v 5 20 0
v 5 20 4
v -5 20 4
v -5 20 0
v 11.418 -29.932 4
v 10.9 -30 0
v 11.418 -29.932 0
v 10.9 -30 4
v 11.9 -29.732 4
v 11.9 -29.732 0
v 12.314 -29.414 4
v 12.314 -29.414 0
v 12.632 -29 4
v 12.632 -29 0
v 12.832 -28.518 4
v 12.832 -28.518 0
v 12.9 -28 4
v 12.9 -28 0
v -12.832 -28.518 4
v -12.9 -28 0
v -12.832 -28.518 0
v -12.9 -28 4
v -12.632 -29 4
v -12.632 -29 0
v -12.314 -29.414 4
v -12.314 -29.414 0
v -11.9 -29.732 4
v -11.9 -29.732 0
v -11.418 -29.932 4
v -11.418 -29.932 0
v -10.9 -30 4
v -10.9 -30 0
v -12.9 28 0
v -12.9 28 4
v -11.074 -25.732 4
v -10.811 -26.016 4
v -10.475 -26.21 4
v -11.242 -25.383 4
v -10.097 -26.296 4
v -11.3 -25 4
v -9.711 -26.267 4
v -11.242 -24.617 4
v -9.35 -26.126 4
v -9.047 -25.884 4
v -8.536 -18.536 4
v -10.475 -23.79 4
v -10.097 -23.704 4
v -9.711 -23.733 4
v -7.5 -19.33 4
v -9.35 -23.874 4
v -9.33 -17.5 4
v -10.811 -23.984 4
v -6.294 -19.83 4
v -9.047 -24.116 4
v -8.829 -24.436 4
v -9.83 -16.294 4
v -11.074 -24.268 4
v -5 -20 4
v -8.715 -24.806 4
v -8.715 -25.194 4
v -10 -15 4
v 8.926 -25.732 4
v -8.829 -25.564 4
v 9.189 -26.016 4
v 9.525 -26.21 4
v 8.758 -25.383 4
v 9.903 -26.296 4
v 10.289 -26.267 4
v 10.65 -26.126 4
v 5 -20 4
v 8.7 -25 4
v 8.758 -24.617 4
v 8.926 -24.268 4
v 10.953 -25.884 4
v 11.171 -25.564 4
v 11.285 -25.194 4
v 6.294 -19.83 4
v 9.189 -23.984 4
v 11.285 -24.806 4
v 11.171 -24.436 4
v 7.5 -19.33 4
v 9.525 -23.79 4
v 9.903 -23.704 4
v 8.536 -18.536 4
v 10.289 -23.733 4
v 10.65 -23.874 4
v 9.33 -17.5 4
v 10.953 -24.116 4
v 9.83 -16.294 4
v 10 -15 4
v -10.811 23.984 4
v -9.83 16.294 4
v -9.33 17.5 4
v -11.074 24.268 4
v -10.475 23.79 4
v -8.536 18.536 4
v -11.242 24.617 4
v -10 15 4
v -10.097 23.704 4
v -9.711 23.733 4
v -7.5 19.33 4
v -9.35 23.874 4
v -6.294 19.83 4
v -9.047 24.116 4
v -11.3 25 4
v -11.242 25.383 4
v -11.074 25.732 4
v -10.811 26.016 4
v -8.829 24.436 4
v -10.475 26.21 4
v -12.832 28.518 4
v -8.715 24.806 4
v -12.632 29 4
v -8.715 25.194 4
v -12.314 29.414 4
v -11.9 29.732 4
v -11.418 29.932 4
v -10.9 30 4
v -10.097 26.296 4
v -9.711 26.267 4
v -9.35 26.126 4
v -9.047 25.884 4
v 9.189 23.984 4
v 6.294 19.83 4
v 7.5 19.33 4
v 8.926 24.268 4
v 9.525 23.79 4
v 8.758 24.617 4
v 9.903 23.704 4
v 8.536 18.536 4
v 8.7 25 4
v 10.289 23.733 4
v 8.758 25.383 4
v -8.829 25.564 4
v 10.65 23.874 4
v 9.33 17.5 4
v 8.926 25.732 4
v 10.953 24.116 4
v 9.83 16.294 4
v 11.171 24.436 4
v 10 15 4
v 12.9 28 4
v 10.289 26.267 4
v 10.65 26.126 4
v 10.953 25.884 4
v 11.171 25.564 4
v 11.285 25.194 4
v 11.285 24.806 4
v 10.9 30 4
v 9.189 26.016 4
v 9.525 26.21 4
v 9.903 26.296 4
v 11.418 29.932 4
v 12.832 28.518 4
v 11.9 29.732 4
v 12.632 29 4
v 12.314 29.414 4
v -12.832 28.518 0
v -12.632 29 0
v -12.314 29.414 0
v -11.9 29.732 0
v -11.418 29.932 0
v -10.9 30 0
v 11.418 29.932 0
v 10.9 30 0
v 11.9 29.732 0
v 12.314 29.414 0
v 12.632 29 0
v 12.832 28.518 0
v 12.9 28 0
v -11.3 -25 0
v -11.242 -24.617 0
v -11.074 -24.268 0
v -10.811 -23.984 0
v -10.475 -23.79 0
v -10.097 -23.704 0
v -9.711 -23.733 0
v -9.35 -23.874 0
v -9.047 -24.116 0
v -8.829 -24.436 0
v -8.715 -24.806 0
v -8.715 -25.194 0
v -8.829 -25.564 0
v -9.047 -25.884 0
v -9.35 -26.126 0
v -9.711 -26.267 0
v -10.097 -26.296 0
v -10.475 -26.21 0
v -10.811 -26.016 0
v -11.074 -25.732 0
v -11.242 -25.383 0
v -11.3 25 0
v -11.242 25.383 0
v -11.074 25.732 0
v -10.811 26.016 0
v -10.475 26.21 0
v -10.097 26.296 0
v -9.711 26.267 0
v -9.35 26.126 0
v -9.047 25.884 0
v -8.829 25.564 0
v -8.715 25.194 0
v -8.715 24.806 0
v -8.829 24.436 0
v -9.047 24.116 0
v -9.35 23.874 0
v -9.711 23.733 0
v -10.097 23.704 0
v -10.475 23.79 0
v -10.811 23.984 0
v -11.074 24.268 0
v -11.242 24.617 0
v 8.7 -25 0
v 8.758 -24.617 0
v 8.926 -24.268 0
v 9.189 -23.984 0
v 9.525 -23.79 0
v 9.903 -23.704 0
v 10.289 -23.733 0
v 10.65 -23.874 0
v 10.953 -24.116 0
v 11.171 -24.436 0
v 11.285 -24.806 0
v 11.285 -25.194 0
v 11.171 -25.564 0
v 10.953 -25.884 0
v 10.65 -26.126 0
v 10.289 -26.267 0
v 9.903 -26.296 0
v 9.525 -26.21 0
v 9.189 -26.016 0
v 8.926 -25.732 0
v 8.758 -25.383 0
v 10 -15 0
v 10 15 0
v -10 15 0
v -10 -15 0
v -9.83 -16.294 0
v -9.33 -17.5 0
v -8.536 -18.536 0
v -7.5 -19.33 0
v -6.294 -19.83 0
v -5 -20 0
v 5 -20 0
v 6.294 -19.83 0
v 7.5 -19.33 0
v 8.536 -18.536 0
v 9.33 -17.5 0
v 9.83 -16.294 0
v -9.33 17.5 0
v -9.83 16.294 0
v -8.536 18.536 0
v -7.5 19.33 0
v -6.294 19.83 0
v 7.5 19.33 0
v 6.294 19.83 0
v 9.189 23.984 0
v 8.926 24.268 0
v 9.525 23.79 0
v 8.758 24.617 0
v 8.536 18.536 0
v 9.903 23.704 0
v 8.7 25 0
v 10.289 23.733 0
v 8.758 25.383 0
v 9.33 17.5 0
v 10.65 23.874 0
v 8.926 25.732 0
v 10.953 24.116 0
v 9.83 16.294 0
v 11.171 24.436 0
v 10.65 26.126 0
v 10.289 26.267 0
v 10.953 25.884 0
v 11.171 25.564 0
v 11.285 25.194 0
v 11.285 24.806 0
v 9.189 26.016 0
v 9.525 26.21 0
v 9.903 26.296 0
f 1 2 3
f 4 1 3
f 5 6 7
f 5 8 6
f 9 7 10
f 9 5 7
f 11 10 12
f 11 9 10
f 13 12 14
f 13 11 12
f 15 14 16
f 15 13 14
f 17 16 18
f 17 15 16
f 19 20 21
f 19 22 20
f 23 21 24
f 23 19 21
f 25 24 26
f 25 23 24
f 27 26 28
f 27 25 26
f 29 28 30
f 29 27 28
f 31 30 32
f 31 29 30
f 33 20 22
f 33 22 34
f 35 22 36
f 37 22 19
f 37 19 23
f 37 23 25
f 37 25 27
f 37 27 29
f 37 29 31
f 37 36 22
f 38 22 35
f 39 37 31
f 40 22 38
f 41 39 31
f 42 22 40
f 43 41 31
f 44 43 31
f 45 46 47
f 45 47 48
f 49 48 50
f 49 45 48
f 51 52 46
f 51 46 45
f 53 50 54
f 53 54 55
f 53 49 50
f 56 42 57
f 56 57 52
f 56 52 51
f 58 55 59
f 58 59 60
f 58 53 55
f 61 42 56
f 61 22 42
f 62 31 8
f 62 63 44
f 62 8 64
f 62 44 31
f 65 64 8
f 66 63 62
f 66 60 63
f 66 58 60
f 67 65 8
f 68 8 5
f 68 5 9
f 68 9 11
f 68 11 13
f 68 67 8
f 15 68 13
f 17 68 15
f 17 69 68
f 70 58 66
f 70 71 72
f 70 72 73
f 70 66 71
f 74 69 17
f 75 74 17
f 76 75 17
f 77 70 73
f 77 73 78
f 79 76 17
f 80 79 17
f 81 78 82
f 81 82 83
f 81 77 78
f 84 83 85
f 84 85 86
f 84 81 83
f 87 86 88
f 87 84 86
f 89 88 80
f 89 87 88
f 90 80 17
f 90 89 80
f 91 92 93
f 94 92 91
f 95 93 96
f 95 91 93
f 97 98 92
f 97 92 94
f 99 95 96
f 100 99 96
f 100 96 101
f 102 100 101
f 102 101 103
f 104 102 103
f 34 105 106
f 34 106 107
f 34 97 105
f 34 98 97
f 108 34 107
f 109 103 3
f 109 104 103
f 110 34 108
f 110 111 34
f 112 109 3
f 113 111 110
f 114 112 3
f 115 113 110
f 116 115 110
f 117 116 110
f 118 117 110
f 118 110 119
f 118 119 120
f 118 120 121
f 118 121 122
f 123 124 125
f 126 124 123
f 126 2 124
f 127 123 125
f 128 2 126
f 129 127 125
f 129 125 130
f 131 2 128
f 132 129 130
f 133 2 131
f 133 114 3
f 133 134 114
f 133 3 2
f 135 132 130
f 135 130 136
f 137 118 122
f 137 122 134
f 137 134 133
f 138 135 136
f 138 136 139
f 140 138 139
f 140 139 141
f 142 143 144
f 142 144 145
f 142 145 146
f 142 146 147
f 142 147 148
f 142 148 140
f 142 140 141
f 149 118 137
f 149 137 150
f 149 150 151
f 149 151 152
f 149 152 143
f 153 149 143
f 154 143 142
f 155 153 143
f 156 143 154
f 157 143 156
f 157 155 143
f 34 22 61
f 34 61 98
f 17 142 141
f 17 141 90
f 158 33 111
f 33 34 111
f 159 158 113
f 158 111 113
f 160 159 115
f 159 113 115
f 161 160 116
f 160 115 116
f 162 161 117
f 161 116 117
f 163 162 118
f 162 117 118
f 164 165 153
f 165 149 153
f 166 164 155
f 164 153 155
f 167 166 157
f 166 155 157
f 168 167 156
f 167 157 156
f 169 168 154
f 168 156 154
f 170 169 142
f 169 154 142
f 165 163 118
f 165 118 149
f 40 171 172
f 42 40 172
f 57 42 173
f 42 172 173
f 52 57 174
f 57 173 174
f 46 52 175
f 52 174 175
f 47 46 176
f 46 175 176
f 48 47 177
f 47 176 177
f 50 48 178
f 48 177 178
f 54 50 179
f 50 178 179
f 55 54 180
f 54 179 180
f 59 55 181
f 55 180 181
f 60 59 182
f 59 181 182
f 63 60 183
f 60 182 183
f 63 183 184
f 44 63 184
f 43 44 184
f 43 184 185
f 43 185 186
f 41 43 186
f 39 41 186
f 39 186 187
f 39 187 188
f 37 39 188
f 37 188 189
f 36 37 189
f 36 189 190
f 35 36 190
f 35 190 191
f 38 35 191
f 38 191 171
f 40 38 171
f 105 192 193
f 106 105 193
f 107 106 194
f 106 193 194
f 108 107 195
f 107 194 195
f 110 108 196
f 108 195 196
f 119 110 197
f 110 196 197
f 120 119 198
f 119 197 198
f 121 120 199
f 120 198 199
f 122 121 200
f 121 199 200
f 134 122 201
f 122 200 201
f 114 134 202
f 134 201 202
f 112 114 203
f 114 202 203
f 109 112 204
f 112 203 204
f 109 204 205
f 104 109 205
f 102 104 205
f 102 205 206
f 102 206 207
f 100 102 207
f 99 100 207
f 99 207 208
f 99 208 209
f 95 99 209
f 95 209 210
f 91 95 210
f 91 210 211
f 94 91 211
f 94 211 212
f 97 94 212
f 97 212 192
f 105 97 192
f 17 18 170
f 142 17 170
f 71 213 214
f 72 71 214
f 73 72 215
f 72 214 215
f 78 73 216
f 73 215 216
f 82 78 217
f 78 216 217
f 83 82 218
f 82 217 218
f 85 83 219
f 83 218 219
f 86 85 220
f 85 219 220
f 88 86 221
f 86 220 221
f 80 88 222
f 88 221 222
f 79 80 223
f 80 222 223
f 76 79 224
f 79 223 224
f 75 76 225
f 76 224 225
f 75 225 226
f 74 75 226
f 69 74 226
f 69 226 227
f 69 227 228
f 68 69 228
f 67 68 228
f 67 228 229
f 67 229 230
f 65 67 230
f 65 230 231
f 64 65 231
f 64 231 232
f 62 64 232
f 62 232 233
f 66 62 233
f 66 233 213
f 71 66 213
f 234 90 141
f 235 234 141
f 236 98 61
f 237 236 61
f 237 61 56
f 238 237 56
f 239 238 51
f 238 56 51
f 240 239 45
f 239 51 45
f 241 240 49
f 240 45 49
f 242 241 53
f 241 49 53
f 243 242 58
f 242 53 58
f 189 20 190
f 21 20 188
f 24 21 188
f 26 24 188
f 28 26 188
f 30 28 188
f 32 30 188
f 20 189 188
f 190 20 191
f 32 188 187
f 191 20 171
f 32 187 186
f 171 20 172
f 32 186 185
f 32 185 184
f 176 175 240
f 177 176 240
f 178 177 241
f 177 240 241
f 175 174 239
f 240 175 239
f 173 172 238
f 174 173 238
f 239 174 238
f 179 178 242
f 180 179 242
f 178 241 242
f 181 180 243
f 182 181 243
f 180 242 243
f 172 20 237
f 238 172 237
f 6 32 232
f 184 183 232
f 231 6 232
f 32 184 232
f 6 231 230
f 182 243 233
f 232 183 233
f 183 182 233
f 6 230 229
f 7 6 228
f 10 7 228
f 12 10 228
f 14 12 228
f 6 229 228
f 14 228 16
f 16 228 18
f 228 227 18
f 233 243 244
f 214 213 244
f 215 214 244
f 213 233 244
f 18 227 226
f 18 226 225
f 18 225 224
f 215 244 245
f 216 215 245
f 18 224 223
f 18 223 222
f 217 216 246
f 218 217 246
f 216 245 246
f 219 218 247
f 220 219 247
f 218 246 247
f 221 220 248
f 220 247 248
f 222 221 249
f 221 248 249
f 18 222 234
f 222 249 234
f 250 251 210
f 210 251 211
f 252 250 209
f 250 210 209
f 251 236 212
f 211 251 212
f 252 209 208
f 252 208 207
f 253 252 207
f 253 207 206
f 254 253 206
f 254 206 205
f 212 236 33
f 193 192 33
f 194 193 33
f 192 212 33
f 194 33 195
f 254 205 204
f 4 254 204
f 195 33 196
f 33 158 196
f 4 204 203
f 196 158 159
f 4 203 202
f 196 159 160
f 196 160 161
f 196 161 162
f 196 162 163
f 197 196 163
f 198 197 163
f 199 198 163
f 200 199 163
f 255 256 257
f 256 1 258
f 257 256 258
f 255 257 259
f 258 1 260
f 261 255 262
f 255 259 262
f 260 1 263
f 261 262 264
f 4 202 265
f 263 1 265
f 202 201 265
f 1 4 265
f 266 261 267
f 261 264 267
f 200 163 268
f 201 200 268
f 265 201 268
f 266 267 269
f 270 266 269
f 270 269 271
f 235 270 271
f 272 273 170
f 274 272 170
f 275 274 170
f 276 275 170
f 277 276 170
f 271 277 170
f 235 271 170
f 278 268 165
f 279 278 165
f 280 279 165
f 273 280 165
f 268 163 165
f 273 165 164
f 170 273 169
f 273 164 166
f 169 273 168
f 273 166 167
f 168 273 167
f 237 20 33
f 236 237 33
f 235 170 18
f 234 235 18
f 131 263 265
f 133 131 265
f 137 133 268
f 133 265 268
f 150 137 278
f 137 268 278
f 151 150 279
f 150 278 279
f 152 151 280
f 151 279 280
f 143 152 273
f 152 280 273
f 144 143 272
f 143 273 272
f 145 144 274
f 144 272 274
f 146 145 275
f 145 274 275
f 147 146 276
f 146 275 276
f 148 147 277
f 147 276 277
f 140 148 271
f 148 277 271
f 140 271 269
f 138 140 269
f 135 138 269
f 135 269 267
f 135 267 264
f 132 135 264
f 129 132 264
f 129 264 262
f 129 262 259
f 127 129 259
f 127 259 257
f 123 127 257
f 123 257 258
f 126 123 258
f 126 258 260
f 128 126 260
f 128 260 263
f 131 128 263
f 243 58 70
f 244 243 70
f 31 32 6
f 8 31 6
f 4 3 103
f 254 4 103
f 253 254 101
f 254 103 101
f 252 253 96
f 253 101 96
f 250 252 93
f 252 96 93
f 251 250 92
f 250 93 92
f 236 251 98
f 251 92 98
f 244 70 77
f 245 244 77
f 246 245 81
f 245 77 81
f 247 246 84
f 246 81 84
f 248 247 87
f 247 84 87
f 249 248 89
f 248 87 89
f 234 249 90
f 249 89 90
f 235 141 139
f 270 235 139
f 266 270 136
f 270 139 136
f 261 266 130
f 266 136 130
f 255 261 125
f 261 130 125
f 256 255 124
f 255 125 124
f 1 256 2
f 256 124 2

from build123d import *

# Parameters (mm, degrees)
SZKIC1_W                    = 25.8
SZKIC1_H                    = 60
DODANIE_WYCI_GNI_CIE1_DEPTH = 4
OTW_R_POD_RUB_M21_D         = 2.6
ZAOKR_GLENIE1_R             = 2
WYTNIJ_WYCI_GNI_CIE1_REACH  = 6


with BuildPart() as part:
    # Szkic1 → Dodanie-wyciągnięcie1 (new body)
    with BuildSketch(Plane.XY):
        Rectangle(SZKIC1_W, SZKIC1_H)
    extrude(amount=DODANIE_WYCI_GNI_CIE1_DEPTH)

    # Otwór pod śrubę M21 (through all)
    with Locations(Plane.XY.offset(4)):
        with Locations((-10, 25), (10, 25), (10, -25), (-10, -25)):
            Hole(OTW_R_POD_RUB_M21_D / 2)

    # Zaokrąglenie1
    zaokr_glenie1_edges = [part.edges().sort_by_distance(p)[0] for p in [
        (12.9, -30, 2),
        (-12.9, -30, 2),
        (-12.9, 30, 2),
        (12.9, 30, 2),
    ]]
    fillet(zaokr_glenie1_edges, radius=ZAOKR_GLENIE1_R)

    # Szkic5 → Wytnij-wyciągnięcie1 (cut, up to next)
    with BuildSketch(Plane.XY.offset(4), mode=Mode.PRIVATE) as wytnij_wyci_gni_cie1_sk1:
        with BuildLine():
            Line((5, 20), (-5, 20))
            ThreePointArc((-5, 20), (-8.535533906, 18.535533906), (-10, 15))
            Line((-10, 15), (-10, -15))
            ThreePointArc((-10, -15), (-8.535533906, -18.535533906), (-5, -20))
            Line((-5, -20), (5, -20))
            ThreePointArc((5, -20), (8.535533906, -18.535533906), (10, -15))
            Line((10, -15), (10, 15))
            ThreePointArc((10, 15), (8.535533906, 18.535533906), (5, 20))
        make_face()
    wytnij_wyci_gni_cie1_tool1 = extrude(wytnij_wyci_gni_cie1_sk1.sketch, amount=-WYTNIJ_WYCI_GNI_CIE1_REACH, mode=Mode.PRIVATE) & part.part
    add(wytnij_wyci_gni_cie1_tool1.solids().sort_by_distance((0, 0, 4))[0], mode=Mode.SUBTRACT)


solid = part.part
